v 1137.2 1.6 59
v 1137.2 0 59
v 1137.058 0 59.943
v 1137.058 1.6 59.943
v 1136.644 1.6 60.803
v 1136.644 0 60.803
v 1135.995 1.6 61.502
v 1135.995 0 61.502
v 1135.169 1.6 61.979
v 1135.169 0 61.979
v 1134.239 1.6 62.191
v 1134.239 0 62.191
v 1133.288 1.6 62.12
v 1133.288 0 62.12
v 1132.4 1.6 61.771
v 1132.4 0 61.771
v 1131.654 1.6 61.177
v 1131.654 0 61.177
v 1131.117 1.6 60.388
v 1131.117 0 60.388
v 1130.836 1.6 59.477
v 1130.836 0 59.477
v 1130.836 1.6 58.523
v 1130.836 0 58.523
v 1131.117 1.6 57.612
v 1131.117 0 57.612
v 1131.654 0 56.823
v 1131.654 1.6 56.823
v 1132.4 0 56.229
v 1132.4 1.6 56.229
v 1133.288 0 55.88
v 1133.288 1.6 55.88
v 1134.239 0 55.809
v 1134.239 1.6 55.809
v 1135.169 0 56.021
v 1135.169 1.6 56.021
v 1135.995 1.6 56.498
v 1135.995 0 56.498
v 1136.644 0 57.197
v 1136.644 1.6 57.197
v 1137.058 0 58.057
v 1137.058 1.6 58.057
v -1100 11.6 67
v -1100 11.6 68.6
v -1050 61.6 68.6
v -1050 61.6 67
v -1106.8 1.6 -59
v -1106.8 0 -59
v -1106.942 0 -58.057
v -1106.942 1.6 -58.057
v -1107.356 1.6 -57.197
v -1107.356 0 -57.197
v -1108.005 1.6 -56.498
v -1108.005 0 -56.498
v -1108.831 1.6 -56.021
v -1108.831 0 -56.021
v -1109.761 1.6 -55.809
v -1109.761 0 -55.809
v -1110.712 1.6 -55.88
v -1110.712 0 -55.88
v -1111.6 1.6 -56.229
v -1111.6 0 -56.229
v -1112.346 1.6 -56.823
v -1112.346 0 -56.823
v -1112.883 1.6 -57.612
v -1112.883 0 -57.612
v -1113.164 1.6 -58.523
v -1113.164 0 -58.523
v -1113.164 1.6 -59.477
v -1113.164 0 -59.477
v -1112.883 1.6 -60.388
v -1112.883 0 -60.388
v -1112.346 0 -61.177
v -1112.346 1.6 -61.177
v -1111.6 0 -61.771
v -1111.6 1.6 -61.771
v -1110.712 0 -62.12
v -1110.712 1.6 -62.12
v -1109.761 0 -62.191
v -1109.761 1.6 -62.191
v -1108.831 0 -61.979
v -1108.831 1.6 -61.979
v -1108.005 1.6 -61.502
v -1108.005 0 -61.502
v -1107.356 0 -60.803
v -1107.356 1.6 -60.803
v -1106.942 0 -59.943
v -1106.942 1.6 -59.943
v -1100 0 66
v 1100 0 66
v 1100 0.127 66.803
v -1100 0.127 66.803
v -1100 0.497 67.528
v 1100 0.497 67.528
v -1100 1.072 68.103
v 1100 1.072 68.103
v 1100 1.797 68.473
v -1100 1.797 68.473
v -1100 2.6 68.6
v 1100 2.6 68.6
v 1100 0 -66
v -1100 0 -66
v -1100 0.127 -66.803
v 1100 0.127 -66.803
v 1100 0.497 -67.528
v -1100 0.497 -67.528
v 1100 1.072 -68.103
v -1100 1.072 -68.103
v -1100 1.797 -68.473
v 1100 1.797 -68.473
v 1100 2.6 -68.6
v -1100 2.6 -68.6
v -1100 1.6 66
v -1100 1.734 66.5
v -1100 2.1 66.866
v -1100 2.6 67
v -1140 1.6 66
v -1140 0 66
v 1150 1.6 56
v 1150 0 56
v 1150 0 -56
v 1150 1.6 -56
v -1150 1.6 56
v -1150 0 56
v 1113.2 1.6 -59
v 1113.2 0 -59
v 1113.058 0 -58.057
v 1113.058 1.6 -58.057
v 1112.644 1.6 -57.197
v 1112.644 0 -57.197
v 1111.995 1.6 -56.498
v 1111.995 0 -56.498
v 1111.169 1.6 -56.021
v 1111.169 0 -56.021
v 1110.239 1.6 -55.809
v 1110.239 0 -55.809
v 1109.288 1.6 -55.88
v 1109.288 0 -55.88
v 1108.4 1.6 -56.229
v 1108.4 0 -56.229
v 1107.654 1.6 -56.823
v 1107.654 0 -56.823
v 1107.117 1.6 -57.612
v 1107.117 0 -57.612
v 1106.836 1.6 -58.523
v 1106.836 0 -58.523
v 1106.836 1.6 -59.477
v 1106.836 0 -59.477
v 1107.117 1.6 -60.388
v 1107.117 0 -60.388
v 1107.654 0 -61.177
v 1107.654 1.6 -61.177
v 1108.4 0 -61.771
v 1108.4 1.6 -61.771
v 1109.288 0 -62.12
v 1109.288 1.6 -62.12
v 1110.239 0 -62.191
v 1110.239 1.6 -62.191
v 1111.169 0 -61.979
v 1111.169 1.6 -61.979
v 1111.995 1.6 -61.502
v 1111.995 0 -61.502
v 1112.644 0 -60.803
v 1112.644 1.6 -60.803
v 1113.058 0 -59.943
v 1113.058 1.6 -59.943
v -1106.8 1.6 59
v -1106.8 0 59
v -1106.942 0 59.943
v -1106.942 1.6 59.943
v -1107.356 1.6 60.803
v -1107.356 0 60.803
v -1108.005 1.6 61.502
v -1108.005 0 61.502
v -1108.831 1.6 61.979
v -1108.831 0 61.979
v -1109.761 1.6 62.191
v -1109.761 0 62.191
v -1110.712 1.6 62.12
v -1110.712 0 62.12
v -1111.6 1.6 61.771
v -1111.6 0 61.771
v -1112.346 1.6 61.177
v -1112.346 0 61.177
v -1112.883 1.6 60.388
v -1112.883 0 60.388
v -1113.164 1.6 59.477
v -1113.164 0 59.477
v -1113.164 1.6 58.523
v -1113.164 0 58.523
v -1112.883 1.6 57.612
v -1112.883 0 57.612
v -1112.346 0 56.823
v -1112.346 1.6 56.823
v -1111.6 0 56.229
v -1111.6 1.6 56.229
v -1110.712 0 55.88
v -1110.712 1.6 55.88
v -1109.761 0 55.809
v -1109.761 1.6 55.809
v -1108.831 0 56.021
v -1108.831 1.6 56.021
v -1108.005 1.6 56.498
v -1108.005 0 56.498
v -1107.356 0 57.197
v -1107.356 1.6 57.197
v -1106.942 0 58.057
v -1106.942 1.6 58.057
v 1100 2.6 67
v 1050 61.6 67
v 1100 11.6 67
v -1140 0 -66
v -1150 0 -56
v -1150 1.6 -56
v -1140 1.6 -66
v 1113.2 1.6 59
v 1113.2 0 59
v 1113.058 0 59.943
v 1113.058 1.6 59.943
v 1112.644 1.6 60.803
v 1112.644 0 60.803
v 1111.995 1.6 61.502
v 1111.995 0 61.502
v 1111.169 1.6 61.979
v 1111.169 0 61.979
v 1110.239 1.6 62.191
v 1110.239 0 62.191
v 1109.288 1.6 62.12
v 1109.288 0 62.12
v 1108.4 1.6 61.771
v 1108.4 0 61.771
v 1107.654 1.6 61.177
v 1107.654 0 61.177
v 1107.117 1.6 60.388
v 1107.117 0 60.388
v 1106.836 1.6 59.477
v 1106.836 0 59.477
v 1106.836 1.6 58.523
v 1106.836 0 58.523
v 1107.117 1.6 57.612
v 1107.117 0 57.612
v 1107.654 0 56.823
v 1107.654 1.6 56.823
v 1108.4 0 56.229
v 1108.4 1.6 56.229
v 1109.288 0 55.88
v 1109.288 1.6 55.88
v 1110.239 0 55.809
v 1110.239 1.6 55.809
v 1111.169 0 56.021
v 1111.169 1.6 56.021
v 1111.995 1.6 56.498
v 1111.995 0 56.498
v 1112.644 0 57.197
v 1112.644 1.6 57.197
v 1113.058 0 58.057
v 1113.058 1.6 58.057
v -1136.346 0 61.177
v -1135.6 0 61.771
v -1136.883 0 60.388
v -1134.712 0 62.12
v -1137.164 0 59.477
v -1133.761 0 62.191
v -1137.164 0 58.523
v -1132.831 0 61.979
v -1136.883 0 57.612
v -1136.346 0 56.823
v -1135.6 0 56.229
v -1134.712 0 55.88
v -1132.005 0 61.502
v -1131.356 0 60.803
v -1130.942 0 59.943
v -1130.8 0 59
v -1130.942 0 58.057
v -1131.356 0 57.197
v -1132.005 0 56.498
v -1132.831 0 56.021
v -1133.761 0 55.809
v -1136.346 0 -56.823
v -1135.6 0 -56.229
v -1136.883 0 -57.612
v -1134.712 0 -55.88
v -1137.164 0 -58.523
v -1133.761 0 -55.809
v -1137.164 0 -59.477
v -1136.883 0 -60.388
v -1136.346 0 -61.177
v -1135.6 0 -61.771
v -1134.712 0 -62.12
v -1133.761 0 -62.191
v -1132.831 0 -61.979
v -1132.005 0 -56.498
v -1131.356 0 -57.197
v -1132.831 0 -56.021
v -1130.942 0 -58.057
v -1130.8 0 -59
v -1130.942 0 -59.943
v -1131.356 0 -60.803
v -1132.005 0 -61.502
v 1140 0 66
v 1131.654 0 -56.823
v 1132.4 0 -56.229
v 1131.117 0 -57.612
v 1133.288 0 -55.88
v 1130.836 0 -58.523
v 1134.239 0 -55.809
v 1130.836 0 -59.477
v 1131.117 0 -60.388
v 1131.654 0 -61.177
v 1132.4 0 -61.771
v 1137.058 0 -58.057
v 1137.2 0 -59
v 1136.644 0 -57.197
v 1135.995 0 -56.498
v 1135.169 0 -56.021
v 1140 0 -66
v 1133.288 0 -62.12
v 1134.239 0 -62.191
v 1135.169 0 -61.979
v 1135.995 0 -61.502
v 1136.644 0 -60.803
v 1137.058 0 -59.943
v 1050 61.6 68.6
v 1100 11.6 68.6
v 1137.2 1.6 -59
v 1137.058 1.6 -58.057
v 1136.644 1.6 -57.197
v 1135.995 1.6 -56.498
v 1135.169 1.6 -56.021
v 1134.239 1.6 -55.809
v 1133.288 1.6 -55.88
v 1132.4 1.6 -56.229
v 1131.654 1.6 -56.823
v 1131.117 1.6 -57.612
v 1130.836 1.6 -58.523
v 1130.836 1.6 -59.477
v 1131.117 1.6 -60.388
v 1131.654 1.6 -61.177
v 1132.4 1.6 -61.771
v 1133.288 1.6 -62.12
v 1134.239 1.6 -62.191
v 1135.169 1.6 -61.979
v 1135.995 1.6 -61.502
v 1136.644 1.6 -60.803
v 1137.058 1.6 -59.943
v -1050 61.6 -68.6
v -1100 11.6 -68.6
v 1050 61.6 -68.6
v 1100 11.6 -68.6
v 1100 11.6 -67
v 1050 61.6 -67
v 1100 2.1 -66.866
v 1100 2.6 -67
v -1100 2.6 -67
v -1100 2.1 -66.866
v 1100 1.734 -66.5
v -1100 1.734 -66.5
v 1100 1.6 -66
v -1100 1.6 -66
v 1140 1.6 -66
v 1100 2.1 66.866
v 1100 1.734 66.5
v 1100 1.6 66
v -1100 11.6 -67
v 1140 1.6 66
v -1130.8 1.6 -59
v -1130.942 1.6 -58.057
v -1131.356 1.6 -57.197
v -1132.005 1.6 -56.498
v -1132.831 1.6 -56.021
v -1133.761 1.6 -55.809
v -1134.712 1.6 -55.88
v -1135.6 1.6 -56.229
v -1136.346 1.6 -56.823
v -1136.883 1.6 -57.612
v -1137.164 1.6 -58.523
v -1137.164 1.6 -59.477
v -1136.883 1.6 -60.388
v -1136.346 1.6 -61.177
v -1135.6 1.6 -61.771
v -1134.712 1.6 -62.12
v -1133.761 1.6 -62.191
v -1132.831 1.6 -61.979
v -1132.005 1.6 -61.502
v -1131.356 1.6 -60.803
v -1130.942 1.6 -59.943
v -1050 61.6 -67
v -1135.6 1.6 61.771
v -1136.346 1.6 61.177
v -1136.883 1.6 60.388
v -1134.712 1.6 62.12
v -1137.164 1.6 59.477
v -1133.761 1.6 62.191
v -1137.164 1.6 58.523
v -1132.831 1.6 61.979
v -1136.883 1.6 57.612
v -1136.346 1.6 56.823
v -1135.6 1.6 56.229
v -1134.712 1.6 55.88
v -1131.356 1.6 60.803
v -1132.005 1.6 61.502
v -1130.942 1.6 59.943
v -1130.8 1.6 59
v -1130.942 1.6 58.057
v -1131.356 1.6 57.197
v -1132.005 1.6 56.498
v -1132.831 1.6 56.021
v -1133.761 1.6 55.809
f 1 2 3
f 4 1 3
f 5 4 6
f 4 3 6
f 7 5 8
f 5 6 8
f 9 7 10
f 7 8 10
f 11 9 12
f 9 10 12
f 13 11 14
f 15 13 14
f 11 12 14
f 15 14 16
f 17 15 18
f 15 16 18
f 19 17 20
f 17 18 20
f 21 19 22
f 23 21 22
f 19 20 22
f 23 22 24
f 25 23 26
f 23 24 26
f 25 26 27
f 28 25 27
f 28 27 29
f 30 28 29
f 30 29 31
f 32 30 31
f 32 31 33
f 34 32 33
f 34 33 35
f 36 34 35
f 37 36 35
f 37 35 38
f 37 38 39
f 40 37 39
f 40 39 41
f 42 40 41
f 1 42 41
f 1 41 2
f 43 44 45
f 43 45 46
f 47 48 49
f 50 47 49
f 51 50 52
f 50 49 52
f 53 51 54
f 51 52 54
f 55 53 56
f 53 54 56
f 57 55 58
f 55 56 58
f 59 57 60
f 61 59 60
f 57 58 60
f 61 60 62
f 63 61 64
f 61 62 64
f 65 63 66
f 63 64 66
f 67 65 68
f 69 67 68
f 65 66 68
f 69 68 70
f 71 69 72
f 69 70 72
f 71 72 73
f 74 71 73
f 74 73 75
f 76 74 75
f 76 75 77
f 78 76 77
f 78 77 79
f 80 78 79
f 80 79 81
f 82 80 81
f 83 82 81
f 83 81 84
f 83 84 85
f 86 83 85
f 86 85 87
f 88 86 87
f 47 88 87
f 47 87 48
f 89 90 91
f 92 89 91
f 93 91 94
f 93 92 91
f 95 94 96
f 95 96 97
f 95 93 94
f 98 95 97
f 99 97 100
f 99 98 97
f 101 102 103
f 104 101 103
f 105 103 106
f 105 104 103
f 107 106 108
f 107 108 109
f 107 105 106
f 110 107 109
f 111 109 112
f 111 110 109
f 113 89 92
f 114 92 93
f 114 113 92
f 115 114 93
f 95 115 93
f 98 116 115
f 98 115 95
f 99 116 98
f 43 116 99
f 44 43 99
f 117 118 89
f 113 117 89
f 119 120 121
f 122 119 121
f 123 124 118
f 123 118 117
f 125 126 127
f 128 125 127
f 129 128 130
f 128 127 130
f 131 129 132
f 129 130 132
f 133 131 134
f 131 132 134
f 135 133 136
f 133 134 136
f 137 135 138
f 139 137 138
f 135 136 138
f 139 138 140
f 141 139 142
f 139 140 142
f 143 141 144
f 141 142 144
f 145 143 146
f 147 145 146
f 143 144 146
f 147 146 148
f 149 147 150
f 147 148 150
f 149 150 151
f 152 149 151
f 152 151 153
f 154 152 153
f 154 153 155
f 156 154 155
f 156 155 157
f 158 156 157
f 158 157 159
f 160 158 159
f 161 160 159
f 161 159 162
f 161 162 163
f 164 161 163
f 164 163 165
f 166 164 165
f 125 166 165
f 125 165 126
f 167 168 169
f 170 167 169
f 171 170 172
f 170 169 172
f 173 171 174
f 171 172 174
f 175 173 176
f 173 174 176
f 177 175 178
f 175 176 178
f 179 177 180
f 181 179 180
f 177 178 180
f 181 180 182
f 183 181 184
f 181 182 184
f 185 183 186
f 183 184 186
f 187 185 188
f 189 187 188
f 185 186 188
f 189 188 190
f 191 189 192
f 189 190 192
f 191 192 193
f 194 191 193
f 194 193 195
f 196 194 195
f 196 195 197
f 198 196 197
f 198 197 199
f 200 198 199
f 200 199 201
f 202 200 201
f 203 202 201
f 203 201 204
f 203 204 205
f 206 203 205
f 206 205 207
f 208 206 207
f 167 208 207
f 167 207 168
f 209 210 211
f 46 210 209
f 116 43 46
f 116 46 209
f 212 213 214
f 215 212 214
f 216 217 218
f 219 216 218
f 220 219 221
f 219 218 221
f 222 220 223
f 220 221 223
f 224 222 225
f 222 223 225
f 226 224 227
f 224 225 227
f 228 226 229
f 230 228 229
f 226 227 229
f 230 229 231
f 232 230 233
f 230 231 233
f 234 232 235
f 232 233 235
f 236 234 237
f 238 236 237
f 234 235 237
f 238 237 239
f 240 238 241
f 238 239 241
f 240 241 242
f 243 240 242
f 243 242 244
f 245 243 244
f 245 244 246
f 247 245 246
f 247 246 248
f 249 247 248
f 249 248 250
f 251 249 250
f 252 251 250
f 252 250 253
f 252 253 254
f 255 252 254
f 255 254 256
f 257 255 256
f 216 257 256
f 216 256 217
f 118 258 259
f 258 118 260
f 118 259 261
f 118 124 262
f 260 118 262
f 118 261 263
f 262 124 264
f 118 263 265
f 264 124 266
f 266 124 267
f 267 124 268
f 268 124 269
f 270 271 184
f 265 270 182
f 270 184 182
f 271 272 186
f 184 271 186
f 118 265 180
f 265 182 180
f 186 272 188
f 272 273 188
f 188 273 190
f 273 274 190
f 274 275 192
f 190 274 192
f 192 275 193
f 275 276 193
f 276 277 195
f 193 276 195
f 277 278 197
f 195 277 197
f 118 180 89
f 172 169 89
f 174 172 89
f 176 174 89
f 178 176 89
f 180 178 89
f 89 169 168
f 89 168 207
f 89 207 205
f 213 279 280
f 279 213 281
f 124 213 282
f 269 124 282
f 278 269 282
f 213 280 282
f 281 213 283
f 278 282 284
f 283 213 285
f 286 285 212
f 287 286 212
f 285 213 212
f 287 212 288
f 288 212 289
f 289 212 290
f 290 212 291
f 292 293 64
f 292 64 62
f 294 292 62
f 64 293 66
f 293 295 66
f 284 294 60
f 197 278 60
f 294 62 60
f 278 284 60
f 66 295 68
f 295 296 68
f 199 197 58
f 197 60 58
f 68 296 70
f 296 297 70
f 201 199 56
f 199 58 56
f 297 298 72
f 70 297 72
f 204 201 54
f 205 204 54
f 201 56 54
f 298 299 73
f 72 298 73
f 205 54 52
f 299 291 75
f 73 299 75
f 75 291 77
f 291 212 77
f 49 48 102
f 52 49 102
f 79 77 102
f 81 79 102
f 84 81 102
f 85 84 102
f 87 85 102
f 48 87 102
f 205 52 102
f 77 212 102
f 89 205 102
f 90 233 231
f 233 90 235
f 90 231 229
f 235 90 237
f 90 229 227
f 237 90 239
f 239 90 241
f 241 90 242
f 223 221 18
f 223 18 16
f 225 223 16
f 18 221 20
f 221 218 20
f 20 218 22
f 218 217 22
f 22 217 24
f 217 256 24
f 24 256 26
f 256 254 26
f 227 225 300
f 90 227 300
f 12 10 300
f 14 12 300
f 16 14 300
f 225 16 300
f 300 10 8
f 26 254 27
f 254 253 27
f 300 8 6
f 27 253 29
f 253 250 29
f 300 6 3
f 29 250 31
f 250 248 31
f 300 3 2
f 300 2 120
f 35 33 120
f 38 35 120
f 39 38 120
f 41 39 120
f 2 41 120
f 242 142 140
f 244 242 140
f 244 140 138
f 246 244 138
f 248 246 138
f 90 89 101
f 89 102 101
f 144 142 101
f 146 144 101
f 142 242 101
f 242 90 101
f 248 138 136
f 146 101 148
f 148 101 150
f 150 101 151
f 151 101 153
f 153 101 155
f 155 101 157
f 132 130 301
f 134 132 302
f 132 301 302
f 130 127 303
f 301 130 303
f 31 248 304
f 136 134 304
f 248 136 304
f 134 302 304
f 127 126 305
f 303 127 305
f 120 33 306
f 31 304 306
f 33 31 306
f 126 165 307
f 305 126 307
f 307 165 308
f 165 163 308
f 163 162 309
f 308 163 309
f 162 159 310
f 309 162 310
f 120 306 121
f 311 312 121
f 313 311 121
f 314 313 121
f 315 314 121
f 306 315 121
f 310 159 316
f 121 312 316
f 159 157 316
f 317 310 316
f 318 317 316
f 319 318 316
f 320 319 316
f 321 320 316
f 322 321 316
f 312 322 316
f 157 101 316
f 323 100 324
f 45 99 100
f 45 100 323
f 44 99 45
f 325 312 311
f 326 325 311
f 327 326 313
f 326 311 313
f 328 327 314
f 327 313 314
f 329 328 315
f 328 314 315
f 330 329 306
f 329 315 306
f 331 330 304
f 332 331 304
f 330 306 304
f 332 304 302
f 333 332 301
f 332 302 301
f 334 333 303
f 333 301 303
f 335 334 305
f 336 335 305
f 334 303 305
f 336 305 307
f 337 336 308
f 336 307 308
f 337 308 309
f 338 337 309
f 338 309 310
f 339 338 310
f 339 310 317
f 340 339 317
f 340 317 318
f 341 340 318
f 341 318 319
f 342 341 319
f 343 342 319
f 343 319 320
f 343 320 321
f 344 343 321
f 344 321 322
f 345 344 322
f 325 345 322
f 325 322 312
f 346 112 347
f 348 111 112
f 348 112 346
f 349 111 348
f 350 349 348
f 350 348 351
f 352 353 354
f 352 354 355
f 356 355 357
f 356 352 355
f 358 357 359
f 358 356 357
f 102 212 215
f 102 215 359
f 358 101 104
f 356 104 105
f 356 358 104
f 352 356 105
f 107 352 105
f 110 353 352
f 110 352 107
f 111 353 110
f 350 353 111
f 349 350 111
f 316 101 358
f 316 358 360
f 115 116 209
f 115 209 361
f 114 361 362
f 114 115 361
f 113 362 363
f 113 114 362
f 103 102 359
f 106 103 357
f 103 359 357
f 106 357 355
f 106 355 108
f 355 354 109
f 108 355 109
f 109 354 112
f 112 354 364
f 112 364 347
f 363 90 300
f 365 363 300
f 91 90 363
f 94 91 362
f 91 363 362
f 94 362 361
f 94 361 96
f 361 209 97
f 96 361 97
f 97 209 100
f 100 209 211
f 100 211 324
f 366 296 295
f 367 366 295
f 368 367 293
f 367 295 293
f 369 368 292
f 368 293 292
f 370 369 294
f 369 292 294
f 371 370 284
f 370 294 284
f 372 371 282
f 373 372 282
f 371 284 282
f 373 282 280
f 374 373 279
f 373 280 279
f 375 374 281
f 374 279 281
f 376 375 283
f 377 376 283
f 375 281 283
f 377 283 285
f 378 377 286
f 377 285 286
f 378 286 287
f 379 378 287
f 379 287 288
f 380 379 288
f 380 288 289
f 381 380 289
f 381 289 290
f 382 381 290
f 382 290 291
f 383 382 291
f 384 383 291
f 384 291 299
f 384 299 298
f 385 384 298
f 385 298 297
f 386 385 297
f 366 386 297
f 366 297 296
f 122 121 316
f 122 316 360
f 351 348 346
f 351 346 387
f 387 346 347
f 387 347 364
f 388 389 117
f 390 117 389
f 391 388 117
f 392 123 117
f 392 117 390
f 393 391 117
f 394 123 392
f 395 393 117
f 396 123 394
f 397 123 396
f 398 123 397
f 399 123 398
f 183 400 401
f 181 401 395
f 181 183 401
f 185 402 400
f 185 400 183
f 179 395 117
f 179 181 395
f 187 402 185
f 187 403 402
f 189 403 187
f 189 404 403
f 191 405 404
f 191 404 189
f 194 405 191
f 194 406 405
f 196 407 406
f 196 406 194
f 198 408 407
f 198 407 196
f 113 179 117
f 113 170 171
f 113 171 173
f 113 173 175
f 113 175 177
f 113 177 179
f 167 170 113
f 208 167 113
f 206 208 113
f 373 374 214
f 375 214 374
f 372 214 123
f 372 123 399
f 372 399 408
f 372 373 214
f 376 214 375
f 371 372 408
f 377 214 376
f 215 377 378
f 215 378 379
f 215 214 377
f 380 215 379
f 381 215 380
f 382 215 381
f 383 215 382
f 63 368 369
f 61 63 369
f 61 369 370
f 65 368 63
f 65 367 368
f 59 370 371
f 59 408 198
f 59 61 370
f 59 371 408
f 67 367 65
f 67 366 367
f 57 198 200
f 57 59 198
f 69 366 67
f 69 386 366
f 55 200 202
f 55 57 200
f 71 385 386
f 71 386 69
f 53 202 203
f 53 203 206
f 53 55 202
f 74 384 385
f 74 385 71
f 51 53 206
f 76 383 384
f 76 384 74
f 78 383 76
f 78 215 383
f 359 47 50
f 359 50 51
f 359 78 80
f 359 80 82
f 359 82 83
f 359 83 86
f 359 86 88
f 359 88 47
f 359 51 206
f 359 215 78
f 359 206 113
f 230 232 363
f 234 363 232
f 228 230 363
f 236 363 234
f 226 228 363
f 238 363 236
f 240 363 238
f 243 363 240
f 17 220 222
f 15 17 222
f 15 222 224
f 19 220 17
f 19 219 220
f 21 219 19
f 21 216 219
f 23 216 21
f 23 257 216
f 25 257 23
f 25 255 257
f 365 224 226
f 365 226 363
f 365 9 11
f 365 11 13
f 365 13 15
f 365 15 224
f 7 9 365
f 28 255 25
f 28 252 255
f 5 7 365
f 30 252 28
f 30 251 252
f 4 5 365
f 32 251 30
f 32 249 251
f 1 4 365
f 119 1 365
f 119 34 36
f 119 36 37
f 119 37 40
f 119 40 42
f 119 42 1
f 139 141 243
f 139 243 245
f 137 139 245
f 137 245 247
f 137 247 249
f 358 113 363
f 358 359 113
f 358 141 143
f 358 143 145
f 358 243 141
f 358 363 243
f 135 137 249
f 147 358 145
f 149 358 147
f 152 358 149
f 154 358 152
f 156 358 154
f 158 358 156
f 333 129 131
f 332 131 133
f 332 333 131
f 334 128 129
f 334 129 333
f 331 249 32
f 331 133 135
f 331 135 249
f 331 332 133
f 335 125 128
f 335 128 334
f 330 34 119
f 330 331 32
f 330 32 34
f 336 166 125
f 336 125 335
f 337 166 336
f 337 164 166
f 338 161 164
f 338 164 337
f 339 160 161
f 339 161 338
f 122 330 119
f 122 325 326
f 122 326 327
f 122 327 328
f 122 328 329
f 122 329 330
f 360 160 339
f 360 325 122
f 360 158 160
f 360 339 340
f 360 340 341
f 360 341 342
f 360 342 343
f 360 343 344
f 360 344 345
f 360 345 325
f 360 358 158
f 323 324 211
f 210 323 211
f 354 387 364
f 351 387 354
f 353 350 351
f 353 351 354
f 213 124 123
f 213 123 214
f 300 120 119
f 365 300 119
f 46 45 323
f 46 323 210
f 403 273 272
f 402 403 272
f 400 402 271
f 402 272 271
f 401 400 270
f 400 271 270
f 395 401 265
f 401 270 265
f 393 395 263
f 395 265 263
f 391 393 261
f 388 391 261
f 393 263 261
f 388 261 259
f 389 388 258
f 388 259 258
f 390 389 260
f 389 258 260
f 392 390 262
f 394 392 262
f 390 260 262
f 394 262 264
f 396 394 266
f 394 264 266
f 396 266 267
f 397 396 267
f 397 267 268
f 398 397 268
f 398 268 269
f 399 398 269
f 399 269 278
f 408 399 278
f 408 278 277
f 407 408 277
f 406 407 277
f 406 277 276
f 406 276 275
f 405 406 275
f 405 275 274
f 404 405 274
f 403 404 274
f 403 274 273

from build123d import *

# Parameters (mm, degrees)
SKETCH_1_W                  = 2300
SKETCH_1_H                  = 132
SM_BASE_FLANGE_1_DEPTH      = 1.6
SM_EDGE_FLANGE_1_DEPTH      = 2200
SM_EDGE_FLANGE_1_BEND_DEPTH = 2200
HOLE_WIZARD_6_4_6_4_1_D     = 6.4
HOLE_WIZARD_6_4_6_4_1_DEPTH = 2
CHAMFER_1_SIZE              = 50
CHAMFER_3_SIZE              = 10


# Sheet-metal steps are written as plain solids
with BuildPart() as part:
    # Sketch 1 → 基材-凸緣1 (new body)
    with BuildSketch(Plane(origin=(0, 0, 0), x_dir=(1, 0, 0), z_dir=(0, 1, 0))):
        Rectangle(SKETCH_1_W, SKETCH_1_H)
    extrude(amount=SM_BASE_FLANGE_1_DEPTH)

    # 邊線-凸緣1 section (across the edge) → 邊線-凸緣1 (add)
    with BuildSketch(Plane(origin=(1100, 1.6, -67), x_dir=(0, 0, 1), z_dir=(-1, 0, 0))):
        with BuildLine():
            Line((-1.6, 1), (-1.6, 60))
            Line((-1.6, 60), (0, 60))
            Line((0, 60), (0, 1))
            ThreePointArc((0, 1), (0.292893219, 0.292893219), (1, 0))
            Line((1, 0), (1, -1.6))
            ThreePointArc((1, -1.6), (-0.838477631, -0.838477631), (-1.6, 1))
        make_face()
    extrude(amount=SM_EDGE_FLANGE_1_DEPTH)

    # 邊線-凸緣1 section 2 (across the edge) → 邊線-凸緣1 bend (add)
    with BuildSketch(Plane(origin=(-1100, 1.6, 67), x_dir=(0, 0, -1), z_dir=(1, 0, 0))):
        with BuildLine():
            Line((-1.6, 1), (-1.6, 60))
            Line((-1.6, 60), (0, 60))
            Line((0, 60), (0, 1))
            ThreePointArc((0, 1), (0.292893219, 0.292893219), (1, 0))
            Line((1, 0), (1, -1.6))
            ThreePointArc((1, -1.6), (-0.838477631, -0.838477631), (-1.6, 1))
        make_face()
    extrude(amount=SM_EDGE_FLANGE_1_BEND_DEPTH)

    # Ø6.4 (6.4) 直徑孔1
    with Locations(Plane(origin=(0, 1.6, 0), x_dir=(-1, 0, 0), z_dir=(0, 1, 0))):
        with Locations((1110, -59), (1134, -59), (1134, 59), (1110, 59), (-1110, -59), (-1134, -59), (-1110, 59), (-1134, 59)):
            Hole(HOLE_WIZARD_6_4_6_4_1_D / 2, depth=HOLE_WIZARD_6_4_6_4_1_DEPTH)

    # 導角1
    chamfer_1_edges = [part.edges().sort_by_distance(p)[0] for p in [
        (1100, 61.6, -67.8),
        (-1100, 61.6, -67.8),
        (-1100, 61.6, 67.8),
        (1100, 61.6, 67.8),
    ]]
    chamfer(chamfer_1_edges, length=CHAMFER_1_SIZE)

    # 導角3
    chamfer_3_edges = [part.edges().sort_by_distance(p)[0] for p in [
        (-1150, 0.8, 66),
        (-1150, 0.8, -66),
        (1150, 0.8, -66),
        (1150, 0.8, 66),
    ]]
    chamfer(chamfer_3_edges, length=CHAMFER_3_SIZE)


solid = part.part
